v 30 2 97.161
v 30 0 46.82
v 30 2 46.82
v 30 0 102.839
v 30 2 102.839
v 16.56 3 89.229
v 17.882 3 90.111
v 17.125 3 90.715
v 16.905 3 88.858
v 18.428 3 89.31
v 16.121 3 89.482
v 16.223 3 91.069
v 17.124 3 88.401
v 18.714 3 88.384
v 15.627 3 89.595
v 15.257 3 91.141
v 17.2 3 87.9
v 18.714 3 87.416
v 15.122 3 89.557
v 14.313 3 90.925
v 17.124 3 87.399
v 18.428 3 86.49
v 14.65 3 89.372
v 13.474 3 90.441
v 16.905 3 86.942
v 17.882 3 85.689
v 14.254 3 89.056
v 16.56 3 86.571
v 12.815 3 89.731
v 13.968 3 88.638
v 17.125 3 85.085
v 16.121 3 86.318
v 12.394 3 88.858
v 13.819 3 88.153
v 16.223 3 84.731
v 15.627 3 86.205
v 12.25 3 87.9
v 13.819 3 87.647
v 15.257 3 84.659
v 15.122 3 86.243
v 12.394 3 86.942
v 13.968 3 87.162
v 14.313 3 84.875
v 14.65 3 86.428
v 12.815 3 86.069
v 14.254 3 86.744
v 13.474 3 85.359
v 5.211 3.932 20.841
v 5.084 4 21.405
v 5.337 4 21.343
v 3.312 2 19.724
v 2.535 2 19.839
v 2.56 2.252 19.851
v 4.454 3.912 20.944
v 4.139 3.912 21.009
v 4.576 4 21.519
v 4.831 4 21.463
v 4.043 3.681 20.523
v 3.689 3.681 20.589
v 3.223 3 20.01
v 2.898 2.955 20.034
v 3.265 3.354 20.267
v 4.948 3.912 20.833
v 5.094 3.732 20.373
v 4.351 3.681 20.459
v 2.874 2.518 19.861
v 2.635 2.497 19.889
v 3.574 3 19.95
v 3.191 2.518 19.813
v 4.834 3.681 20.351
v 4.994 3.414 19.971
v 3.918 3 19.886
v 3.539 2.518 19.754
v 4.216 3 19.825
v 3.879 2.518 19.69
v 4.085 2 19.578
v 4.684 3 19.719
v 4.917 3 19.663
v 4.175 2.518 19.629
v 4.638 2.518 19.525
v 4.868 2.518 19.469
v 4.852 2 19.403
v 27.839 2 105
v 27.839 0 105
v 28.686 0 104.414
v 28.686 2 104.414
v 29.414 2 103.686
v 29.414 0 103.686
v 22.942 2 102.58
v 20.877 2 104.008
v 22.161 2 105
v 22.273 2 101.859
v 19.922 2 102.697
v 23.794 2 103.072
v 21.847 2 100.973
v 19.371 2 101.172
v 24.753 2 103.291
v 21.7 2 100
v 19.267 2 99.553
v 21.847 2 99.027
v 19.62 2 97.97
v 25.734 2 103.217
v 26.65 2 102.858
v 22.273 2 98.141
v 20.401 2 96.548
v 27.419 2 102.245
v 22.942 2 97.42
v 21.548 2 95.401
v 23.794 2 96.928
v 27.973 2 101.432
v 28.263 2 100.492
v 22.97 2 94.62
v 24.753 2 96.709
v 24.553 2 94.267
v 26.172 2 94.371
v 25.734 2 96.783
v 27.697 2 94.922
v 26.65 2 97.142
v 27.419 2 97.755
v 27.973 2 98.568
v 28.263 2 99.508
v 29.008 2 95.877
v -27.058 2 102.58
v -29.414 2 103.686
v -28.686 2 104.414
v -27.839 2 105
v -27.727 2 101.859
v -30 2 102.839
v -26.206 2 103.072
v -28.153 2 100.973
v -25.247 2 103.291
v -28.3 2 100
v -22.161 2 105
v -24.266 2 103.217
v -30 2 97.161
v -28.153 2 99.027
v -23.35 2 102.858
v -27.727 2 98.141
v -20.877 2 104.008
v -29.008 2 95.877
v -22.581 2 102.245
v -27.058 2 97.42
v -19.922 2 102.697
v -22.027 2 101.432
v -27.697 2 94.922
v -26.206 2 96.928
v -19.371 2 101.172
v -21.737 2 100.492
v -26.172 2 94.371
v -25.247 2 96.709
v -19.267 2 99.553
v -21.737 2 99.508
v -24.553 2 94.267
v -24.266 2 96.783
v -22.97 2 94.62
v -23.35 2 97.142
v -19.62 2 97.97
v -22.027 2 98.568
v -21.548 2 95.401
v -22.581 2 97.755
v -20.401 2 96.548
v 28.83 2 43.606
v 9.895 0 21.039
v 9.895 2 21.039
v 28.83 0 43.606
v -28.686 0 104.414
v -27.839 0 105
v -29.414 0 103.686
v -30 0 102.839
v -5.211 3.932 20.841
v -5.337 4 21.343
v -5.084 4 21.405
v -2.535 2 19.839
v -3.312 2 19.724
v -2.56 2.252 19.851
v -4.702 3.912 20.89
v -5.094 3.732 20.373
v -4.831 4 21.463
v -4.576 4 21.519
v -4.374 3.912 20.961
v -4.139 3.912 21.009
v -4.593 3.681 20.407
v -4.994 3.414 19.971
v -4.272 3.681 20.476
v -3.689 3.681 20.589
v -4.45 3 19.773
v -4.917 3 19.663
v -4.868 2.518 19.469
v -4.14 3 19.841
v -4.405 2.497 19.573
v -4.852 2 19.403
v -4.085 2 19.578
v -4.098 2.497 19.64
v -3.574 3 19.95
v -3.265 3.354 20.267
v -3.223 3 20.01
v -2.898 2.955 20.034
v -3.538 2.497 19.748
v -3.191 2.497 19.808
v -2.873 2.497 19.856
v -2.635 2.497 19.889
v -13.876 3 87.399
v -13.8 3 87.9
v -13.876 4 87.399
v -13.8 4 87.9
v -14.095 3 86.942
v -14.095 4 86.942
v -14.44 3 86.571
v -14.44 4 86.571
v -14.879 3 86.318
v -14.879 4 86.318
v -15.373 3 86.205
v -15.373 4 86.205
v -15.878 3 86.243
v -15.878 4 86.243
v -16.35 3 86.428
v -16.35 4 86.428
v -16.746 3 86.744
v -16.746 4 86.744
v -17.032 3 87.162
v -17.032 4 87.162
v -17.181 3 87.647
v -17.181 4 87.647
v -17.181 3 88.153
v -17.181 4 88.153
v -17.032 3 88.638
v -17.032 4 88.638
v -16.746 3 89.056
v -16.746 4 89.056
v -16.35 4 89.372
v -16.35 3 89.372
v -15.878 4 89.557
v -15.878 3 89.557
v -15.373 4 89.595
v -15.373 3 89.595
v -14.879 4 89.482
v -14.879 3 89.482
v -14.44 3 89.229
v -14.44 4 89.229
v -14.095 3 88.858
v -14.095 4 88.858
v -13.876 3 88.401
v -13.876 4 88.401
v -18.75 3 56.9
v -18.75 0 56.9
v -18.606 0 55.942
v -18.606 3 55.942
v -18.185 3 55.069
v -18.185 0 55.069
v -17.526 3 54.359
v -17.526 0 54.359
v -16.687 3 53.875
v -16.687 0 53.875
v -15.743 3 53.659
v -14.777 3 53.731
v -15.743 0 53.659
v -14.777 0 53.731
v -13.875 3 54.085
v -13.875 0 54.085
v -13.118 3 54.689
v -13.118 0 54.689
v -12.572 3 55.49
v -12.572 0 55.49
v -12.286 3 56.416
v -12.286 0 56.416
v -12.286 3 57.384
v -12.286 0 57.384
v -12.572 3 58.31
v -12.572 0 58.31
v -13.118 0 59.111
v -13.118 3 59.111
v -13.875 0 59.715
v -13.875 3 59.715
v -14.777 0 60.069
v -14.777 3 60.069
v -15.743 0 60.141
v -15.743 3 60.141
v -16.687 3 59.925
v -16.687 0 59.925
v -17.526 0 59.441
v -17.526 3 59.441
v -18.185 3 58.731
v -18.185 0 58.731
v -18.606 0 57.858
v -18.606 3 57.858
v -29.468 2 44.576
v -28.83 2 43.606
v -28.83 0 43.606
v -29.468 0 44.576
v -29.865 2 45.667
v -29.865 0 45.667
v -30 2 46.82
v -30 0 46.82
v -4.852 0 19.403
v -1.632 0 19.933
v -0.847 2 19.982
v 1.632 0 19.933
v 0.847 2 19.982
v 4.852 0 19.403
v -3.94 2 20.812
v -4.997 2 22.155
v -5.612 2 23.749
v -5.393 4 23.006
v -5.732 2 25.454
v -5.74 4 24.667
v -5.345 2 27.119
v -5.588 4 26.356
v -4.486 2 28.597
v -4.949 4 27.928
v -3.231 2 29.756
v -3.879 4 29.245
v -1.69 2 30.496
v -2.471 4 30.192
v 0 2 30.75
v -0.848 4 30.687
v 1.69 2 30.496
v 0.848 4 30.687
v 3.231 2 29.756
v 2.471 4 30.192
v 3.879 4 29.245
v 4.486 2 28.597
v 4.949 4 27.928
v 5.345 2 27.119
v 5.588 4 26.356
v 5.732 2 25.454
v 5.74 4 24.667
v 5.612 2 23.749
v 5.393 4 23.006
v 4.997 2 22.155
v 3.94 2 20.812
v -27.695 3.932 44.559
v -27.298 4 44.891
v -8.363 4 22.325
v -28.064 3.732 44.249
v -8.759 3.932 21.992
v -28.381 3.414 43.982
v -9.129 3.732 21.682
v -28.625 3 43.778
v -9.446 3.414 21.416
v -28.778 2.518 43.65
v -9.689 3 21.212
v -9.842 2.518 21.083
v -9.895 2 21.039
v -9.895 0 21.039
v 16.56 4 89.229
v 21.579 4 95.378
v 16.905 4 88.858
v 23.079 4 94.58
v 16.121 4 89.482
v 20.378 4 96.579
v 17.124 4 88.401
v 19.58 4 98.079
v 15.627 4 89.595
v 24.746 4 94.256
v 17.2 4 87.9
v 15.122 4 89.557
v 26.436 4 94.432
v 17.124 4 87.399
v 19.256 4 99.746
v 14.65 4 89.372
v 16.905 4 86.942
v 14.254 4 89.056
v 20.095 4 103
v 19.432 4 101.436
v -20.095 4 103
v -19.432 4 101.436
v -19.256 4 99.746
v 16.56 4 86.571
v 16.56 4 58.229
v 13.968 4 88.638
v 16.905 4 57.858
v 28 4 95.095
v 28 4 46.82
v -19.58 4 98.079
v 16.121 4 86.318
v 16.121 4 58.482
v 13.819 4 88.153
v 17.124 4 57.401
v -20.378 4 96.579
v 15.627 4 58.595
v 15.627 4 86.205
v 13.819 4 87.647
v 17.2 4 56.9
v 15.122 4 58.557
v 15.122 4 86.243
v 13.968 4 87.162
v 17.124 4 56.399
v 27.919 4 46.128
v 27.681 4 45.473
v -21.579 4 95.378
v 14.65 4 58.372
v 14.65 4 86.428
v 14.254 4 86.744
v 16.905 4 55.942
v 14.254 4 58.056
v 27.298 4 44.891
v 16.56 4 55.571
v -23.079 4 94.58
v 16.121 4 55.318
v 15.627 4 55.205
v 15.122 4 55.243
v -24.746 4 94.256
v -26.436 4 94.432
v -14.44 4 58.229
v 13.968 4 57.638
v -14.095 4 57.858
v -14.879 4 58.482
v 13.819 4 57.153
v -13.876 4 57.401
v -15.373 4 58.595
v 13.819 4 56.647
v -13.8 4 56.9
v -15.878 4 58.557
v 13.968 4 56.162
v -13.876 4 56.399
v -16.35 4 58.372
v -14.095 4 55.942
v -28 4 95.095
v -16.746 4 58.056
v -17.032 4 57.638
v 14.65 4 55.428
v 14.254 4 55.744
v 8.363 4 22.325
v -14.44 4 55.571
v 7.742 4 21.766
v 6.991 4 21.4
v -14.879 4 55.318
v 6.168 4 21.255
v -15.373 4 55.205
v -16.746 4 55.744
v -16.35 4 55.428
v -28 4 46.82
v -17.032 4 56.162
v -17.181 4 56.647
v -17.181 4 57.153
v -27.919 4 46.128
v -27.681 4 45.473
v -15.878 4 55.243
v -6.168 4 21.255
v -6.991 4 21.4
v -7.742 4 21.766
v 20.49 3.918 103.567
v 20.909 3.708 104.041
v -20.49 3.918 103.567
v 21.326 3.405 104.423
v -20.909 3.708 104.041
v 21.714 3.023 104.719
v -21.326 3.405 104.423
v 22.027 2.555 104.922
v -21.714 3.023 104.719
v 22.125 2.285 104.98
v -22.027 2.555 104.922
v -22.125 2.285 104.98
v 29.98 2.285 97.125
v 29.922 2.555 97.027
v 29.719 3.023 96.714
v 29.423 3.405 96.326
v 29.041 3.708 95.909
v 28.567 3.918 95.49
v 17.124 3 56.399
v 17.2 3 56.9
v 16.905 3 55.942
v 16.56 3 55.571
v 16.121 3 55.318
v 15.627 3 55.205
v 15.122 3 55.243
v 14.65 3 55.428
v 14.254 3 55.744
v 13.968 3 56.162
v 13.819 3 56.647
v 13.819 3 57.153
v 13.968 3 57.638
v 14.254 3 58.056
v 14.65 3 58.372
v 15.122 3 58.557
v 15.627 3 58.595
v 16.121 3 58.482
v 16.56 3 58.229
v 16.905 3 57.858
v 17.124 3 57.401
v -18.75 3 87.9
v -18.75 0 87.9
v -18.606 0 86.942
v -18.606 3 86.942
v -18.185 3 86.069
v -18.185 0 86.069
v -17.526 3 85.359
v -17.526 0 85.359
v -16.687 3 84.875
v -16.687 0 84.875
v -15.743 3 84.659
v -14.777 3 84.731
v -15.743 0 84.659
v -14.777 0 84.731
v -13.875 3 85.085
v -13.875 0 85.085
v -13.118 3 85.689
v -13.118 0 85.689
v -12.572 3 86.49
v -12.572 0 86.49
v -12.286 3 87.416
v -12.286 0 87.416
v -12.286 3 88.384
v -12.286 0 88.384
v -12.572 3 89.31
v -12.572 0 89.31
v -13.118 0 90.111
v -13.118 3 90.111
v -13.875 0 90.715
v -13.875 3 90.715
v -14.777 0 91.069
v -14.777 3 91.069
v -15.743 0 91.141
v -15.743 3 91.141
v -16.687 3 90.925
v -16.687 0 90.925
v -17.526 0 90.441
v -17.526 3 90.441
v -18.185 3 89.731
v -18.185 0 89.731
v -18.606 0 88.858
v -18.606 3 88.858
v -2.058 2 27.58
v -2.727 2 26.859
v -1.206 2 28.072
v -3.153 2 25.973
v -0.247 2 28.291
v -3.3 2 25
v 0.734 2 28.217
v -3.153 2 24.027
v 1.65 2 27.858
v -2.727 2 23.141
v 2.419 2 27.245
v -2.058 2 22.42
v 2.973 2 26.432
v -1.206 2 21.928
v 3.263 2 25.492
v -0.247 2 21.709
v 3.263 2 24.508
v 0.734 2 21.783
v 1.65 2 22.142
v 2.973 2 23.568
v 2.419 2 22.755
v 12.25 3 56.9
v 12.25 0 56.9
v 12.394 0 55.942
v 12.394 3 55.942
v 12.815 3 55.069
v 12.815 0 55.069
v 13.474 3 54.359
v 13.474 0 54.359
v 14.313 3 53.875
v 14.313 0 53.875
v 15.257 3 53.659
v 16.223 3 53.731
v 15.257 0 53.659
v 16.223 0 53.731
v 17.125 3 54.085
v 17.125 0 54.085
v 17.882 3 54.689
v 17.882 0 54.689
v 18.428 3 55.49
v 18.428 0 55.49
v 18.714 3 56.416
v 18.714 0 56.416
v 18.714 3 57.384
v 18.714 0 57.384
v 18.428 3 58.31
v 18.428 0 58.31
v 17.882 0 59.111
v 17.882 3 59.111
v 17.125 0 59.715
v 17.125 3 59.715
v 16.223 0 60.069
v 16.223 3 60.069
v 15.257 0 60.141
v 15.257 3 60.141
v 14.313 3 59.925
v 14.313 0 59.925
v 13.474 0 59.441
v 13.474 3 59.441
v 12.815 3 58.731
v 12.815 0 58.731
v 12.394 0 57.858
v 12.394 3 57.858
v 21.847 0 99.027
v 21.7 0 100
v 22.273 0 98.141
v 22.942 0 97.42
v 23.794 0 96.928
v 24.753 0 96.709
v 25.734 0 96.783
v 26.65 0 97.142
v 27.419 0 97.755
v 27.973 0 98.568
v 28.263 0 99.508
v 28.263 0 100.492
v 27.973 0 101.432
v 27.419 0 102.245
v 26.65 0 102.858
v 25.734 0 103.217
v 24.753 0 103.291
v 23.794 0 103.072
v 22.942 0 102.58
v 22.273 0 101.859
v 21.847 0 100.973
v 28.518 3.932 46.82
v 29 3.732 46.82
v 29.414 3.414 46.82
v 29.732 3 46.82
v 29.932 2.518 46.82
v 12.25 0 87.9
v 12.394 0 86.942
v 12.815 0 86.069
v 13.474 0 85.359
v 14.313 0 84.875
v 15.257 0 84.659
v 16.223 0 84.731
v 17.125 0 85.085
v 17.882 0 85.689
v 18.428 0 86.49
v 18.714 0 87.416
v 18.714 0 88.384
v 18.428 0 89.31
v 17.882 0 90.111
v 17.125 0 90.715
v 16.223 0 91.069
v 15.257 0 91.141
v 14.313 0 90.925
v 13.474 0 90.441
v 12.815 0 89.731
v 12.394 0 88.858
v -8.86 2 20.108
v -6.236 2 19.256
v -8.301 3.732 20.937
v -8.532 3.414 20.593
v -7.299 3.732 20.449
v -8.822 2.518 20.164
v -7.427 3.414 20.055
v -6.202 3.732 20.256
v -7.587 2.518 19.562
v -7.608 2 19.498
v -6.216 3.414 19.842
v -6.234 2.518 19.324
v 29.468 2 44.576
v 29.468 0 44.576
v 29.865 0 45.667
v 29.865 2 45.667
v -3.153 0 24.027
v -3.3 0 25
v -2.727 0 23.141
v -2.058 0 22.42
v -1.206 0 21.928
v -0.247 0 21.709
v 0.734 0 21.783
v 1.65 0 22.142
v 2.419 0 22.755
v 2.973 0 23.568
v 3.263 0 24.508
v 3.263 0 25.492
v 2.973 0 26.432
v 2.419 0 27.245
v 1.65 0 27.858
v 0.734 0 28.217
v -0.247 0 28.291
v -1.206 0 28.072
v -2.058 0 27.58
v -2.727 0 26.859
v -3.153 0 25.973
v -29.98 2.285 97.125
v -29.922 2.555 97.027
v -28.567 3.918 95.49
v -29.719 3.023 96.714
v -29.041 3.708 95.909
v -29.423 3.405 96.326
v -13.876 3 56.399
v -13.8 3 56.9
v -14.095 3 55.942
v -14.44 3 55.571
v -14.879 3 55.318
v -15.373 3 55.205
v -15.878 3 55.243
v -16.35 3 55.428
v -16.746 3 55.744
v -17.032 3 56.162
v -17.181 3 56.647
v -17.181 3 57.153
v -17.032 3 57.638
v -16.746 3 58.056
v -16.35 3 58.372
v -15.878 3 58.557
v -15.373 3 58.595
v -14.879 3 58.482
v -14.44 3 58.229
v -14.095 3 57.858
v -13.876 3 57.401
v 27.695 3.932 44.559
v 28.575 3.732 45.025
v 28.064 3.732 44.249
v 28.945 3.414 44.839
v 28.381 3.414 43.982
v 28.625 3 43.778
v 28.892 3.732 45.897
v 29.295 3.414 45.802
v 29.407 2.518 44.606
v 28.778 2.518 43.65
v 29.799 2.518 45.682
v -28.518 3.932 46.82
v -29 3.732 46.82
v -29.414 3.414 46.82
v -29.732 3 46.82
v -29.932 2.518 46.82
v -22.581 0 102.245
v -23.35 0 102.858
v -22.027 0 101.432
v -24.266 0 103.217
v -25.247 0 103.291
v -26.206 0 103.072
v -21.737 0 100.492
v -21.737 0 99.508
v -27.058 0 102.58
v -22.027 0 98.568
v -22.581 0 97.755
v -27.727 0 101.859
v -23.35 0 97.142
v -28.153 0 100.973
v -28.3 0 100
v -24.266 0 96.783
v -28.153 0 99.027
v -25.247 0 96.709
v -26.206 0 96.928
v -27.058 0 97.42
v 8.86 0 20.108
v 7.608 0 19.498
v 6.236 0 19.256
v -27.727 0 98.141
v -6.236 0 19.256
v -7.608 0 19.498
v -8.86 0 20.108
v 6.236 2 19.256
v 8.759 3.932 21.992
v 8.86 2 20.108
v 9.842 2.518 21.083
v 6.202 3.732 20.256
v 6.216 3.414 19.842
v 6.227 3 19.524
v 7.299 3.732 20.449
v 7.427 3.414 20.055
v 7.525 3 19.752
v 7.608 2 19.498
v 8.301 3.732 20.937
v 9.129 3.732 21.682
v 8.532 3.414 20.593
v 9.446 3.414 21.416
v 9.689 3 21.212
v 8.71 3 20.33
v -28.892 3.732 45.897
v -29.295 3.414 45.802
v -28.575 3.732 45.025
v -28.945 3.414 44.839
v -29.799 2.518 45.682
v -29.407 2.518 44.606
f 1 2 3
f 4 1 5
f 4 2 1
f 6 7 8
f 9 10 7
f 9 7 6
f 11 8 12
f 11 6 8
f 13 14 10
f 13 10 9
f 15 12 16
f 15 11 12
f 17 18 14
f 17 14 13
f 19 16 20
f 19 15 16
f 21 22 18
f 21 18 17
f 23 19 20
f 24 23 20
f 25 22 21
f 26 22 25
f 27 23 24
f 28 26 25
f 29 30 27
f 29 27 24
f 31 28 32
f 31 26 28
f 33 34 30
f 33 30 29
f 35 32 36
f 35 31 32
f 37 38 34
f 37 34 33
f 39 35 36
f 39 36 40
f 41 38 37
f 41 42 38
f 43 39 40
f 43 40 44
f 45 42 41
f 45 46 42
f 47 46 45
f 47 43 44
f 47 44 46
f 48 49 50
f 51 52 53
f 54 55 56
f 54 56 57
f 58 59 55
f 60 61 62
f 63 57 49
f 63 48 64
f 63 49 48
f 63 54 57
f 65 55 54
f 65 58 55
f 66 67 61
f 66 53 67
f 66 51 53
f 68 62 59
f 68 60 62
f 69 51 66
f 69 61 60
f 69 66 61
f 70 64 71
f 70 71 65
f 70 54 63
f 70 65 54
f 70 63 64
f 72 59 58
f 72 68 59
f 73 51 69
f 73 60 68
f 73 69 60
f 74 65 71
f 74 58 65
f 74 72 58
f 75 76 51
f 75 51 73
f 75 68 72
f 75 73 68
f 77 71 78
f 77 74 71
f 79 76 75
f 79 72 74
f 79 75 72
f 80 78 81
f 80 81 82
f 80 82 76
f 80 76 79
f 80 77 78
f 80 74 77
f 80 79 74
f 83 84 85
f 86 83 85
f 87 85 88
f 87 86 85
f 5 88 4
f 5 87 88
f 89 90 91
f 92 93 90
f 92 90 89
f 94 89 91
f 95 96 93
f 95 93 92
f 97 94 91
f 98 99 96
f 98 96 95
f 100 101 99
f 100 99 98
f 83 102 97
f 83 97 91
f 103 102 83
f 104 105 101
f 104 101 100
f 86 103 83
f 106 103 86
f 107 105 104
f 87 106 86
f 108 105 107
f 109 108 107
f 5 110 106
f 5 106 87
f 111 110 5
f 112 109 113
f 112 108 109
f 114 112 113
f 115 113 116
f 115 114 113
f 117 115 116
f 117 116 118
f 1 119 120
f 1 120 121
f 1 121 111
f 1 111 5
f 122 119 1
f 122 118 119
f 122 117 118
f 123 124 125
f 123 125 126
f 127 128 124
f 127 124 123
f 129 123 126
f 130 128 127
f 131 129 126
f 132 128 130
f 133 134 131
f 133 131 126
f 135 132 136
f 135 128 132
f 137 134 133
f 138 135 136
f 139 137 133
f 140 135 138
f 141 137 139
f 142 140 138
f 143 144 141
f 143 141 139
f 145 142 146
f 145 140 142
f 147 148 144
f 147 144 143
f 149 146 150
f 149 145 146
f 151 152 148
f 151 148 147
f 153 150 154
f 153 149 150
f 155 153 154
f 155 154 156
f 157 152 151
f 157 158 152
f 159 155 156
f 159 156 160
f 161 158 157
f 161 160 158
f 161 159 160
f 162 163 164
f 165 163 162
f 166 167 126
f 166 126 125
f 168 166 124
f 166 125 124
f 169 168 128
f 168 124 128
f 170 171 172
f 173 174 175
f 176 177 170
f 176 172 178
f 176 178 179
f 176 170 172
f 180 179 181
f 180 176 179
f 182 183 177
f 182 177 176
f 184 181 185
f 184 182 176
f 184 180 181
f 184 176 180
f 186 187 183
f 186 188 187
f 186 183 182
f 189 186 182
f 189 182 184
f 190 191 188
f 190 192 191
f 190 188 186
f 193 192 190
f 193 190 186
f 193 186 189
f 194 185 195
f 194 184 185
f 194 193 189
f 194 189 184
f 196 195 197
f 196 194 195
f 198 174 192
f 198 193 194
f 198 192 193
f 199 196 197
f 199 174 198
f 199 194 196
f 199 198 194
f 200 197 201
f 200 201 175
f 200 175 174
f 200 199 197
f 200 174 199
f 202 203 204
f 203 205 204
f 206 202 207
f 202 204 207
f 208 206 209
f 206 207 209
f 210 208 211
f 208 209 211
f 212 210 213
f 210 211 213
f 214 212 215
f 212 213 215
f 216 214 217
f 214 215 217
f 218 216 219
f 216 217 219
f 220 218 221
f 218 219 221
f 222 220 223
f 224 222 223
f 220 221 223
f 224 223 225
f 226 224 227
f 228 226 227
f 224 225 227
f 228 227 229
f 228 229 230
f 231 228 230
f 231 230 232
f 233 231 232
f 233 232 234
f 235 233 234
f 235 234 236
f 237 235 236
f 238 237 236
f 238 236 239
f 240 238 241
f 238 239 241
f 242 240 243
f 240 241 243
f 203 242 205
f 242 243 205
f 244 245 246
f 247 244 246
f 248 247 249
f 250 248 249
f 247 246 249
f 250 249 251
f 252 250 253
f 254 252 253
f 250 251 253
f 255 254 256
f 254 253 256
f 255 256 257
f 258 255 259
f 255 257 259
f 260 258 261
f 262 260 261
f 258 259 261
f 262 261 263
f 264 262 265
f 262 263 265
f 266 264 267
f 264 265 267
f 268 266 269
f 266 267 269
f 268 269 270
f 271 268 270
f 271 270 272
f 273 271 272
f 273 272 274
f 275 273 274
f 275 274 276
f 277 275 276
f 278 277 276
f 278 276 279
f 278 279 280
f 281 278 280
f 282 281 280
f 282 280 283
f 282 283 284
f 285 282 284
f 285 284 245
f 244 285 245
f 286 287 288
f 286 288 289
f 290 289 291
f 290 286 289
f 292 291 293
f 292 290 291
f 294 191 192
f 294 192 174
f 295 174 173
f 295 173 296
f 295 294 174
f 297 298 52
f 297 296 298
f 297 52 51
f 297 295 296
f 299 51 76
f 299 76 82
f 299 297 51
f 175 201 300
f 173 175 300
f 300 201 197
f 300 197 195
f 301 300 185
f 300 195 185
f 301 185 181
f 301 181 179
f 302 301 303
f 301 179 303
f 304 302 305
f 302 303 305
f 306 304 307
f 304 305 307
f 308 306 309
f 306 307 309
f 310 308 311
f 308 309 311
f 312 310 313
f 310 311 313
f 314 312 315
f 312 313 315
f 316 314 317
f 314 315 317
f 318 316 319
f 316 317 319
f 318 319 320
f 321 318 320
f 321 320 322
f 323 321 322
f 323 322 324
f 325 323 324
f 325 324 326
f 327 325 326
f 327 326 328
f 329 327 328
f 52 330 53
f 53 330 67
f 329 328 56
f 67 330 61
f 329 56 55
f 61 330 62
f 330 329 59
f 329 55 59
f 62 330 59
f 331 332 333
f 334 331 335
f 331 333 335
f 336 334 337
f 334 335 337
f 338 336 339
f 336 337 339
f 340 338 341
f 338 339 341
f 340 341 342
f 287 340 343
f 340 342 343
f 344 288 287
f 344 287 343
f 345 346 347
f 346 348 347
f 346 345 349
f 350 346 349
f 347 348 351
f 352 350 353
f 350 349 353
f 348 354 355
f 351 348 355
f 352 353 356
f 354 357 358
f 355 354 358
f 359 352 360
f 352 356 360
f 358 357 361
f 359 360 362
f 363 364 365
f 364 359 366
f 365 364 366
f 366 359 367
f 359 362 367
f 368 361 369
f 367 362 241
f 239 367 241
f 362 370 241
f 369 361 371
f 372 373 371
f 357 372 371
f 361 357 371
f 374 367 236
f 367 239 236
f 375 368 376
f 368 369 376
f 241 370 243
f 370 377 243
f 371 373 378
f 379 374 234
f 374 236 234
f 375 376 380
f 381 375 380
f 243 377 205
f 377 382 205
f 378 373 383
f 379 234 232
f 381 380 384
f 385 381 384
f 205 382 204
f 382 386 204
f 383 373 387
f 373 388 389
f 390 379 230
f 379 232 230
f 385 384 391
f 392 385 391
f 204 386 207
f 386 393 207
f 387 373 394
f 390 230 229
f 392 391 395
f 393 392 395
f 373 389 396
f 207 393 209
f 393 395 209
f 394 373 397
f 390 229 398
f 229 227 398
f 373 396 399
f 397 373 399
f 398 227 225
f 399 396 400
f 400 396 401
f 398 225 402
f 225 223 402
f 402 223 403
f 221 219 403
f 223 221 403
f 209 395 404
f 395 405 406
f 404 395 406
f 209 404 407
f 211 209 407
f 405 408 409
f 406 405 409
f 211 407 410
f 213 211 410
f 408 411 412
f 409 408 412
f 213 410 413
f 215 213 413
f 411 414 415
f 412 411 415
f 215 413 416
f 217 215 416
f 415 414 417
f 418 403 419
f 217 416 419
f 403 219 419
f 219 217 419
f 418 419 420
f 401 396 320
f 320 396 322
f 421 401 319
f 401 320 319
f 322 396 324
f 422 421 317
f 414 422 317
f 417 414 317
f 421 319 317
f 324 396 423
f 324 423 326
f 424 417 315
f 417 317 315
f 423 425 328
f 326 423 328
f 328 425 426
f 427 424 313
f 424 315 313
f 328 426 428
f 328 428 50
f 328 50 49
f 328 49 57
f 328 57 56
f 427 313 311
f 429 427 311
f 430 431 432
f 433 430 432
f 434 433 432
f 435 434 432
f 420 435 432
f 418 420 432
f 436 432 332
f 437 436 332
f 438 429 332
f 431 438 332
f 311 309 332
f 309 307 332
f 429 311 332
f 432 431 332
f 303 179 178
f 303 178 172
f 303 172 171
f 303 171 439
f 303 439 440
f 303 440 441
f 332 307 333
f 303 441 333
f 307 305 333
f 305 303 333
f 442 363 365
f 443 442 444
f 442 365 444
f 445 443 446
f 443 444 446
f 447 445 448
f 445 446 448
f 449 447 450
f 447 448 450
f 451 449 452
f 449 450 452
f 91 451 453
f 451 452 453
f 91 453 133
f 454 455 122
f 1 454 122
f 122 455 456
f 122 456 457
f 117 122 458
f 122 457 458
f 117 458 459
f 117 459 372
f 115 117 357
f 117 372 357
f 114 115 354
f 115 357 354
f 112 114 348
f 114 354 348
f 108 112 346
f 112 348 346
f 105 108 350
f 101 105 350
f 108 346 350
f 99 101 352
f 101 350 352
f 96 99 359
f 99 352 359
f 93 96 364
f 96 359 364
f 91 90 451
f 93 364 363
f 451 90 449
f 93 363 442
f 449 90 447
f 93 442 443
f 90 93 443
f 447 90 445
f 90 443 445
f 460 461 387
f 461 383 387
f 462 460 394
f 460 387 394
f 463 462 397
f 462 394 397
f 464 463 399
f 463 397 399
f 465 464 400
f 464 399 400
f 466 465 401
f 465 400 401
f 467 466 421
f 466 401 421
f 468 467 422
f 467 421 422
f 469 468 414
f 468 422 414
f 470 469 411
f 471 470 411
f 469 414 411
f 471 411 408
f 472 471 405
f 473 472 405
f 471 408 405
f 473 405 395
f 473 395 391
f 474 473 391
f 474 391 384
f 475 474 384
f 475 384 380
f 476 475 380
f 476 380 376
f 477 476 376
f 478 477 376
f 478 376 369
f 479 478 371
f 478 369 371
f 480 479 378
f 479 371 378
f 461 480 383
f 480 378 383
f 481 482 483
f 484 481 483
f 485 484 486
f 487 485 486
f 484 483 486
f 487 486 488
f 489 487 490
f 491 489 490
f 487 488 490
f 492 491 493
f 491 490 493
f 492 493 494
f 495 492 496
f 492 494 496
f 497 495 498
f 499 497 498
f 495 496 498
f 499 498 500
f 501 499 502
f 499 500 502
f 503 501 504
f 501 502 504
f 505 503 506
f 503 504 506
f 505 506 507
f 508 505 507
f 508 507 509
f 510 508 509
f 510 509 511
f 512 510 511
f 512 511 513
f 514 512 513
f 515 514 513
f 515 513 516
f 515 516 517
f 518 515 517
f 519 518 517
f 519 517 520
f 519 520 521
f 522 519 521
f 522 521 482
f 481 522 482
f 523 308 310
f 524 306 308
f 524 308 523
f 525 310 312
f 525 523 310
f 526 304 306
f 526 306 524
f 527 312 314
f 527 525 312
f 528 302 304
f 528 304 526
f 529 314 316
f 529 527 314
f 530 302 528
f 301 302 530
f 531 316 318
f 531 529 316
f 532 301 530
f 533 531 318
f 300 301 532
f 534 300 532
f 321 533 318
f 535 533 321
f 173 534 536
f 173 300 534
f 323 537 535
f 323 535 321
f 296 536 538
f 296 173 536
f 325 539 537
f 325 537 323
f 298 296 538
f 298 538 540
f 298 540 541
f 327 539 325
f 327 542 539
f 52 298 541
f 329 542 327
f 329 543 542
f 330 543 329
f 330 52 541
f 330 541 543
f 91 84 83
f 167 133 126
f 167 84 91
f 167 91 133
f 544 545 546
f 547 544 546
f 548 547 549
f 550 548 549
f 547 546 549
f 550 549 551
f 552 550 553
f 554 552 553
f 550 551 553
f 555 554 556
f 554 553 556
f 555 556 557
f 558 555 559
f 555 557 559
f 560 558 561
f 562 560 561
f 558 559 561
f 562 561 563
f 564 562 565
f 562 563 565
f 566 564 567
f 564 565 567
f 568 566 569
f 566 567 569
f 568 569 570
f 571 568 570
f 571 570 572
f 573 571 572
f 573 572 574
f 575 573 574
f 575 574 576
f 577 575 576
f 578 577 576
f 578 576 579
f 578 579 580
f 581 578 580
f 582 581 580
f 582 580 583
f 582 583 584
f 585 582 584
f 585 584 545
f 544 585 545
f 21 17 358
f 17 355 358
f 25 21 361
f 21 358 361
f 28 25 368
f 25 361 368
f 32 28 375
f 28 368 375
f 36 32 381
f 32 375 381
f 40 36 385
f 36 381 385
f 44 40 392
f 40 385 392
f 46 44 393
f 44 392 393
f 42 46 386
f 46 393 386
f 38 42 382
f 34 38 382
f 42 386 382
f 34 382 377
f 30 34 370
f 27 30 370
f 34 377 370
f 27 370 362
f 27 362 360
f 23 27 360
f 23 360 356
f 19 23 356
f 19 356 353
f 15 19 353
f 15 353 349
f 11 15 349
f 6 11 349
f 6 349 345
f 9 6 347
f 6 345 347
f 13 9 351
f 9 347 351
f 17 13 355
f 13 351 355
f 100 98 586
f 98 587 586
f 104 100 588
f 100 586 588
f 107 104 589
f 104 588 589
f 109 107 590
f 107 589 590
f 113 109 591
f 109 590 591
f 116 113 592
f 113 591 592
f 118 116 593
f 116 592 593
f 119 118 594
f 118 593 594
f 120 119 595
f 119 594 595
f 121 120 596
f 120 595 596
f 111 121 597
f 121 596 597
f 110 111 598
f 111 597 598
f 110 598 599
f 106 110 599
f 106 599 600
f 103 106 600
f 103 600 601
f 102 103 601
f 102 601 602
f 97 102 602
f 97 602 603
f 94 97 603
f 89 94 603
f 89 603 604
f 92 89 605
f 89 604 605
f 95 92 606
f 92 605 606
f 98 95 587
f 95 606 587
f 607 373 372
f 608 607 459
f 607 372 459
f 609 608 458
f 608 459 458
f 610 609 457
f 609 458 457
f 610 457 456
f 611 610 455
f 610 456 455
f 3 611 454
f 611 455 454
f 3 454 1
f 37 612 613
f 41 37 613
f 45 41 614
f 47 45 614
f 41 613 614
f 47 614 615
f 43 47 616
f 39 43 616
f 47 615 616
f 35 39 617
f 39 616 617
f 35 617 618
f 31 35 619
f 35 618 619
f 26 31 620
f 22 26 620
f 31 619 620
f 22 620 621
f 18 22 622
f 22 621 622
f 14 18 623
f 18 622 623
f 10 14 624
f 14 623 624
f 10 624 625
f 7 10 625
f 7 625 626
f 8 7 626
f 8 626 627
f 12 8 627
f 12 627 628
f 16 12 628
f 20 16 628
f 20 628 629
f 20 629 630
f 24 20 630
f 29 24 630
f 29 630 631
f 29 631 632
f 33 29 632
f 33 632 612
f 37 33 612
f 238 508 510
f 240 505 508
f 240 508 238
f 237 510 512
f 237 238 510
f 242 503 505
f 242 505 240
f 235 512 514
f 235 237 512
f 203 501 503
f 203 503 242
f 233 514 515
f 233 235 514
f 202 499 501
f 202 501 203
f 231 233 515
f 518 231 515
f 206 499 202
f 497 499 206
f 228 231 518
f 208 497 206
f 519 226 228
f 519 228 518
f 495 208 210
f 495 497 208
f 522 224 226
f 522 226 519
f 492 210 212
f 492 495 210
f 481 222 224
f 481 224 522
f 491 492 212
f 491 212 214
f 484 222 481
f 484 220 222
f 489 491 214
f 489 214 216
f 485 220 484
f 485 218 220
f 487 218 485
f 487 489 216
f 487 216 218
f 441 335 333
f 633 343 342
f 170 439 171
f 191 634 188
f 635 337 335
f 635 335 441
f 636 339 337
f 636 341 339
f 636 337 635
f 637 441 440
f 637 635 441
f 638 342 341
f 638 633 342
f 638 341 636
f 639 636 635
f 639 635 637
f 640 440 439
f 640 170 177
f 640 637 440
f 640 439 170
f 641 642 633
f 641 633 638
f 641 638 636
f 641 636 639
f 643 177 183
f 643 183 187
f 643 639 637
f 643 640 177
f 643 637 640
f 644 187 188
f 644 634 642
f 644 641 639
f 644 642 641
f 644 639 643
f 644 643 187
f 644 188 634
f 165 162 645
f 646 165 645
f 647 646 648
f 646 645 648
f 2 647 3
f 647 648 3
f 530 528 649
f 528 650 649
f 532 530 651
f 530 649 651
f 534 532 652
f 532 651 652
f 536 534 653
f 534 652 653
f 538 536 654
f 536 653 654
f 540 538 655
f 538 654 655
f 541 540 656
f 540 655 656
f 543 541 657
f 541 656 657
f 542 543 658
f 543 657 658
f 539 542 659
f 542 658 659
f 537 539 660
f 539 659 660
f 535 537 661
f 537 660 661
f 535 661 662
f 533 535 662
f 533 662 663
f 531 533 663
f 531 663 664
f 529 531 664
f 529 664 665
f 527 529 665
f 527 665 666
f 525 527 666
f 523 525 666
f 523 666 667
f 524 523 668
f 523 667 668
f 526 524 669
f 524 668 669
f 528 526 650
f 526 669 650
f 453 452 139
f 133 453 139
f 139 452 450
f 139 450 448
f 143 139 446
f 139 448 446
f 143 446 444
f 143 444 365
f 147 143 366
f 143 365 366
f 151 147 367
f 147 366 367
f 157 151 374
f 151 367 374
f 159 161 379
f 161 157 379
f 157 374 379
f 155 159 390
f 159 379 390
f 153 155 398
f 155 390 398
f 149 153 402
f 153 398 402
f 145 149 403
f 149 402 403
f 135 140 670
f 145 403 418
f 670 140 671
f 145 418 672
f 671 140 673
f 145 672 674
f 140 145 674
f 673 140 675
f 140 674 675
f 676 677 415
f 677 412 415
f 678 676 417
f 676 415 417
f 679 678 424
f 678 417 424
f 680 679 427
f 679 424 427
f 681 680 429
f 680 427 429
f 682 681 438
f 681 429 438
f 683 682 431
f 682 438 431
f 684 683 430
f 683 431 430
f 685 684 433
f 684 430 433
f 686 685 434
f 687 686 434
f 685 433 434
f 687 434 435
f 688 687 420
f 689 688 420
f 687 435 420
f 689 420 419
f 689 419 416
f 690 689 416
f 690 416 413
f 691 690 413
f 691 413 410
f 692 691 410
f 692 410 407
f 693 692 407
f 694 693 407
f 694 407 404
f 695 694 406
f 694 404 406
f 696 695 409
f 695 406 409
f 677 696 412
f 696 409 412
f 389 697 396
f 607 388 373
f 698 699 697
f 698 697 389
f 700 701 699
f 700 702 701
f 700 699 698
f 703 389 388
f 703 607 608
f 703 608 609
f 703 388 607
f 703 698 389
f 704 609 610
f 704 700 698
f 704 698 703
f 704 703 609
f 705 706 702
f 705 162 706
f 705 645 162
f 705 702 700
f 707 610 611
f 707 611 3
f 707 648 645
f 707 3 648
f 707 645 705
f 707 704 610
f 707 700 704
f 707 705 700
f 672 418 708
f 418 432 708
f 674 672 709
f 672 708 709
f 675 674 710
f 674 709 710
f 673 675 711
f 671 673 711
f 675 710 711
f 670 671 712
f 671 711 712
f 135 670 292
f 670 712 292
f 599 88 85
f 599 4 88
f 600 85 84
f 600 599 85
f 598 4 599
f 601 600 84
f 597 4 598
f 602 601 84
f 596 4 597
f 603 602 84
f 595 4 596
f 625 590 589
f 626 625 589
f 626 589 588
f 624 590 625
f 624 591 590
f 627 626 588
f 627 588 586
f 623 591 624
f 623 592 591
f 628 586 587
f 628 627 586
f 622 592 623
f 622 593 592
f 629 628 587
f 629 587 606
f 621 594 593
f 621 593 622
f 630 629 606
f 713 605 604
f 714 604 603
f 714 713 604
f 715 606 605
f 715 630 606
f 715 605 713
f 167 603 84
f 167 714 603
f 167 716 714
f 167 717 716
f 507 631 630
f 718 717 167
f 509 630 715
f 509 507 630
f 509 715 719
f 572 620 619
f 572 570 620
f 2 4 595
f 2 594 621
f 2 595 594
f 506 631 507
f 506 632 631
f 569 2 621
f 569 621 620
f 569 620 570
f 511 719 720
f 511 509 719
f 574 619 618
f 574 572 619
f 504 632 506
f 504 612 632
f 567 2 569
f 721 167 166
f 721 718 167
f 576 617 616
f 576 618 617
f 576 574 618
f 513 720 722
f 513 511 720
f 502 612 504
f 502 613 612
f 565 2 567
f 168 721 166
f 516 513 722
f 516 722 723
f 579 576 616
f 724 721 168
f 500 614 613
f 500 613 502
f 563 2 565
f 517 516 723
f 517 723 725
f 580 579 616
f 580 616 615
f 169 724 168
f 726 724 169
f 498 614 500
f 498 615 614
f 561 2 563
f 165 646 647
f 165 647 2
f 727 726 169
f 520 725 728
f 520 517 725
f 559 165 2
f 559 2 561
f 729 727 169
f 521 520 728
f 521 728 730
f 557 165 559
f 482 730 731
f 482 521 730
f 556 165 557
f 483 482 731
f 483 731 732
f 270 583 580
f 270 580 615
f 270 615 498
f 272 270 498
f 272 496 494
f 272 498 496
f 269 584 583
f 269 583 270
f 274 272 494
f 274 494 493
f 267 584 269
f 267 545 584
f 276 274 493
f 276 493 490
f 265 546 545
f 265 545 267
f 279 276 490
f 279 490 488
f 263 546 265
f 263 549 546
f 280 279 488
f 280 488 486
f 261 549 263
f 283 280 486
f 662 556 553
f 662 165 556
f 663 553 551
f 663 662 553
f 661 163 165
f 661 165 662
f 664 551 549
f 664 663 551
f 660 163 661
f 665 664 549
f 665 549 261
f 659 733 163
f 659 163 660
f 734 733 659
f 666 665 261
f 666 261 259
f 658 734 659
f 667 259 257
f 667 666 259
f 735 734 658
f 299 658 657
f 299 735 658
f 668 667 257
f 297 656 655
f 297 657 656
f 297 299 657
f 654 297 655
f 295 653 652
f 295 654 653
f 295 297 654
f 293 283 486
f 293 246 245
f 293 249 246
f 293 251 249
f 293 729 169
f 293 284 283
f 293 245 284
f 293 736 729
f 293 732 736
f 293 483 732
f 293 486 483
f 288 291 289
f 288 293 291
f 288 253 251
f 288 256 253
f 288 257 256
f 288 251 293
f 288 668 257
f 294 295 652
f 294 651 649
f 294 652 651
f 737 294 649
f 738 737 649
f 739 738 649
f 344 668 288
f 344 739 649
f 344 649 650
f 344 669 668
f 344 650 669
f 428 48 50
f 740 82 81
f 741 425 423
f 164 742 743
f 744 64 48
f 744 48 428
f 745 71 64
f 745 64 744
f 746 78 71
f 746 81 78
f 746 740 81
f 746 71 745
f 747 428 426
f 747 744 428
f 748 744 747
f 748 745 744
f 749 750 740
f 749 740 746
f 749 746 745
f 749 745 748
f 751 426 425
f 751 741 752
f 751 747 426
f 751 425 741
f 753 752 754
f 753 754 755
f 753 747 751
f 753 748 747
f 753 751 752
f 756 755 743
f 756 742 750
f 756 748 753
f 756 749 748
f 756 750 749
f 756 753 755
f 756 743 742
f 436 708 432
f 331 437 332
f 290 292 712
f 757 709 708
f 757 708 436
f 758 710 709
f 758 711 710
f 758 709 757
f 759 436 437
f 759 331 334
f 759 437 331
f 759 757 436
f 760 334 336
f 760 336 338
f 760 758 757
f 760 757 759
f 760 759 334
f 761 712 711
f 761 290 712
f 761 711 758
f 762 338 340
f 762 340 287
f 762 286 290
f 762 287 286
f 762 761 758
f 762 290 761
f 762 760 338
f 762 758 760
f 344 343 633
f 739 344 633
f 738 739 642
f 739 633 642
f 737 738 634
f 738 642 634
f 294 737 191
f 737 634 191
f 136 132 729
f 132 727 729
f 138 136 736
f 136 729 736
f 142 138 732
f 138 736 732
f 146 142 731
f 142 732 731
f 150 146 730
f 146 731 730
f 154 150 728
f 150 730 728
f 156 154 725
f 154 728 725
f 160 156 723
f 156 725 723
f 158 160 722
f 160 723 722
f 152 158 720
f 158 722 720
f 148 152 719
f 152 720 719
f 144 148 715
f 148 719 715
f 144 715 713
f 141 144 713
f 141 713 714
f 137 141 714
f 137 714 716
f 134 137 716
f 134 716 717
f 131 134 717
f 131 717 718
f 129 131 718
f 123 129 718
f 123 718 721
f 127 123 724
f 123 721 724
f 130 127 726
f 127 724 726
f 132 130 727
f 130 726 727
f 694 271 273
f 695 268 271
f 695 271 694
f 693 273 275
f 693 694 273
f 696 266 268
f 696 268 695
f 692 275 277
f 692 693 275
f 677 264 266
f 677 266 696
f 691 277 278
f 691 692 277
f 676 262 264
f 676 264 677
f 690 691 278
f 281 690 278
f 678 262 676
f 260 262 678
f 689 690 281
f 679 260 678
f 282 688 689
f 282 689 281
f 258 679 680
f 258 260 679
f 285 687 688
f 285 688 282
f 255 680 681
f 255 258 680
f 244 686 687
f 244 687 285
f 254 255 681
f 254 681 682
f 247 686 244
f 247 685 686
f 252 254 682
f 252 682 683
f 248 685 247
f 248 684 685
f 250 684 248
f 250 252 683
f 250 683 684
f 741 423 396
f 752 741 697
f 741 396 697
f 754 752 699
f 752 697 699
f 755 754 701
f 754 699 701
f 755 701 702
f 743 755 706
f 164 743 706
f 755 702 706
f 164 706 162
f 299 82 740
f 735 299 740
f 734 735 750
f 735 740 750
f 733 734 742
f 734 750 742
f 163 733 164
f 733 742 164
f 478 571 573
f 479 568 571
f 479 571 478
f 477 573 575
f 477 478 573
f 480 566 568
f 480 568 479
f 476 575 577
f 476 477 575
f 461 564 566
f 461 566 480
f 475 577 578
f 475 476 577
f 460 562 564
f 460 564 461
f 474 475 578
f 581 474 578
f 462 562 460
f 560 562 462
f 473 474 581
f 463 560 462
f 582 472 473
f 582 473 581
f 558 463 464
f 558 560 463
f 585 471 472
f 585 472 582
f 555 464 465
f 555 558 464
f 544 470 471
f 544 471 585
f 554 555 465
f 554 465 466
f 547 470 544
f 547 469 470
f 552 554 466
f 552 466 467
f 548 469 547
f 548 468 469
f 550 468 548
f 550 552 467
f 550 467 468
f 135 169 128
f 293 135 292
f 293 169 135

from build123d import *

# Parameters (mm, degrees)
BOSS_EXTRUDE1_DEPTH            = 4
HOLE1_D                        = 6.6
HOLE1_CBORE_D                  = 11.5
HOLE1_CBORE_DEPTH              = 2
CUT_EXTRUDE3_DEPTH             = 110.27488275
CBORE_FOR_M3_SHCS1_D           = 3.4
CBORE_FOR_M3_SHCS1_CBORE_D     = 6.5
CBORE_FOR_M3_SHCS1_CBORE_DEPTH = 3
FILLET4_R                      = 5
FILLET3_R                      = 2


with BuildPart() as part:
    # Sketch2 → Boss-Extrude1 (new body)
    with BuildSketch(Plane(origin=(0, 0, 0), x_dir=(1, 0, 0), z_dir=(0, 1, 0))):
        with BuildLine():
            Line((-30, -45), (-7.721394619, -18.449391999))
            ThreePointArc((-7.721394619, -18.449391999), (0, -20), (7.721394619, -18.449391999))
            Line((7.721394619, -18.449391999), (30, -45))
            Line((30, -45), (30, -105))
            Line((30, -105), (-30, -105))
            Line((-30, -105), (-30, -45))
        make_face()
    extrude(amount=BOSS_EXTRUDE1_DEPTH)

    # Hole1 (through all)
    with Locations(Plane(origin=(0, 4, 0), x_dir=(1, 0, 0), z_dir=(0, 1, 0))):
        with Locations((-25, -100), (25, -100), (0, -25)):
            CounterBoreHole(HOLE1_D / 2, HOLE1_CBORE_D / 2, HOLE1_CBORE_DEPTH)

    # Sketch5 → Cut-Extrude3 (cut, through all)
    with BuildSketch(Plane(origin=(0, 4, 0), x_dir=(1, 0, 0), z_dir=(0, 1, 0))):
        with BuildLine():
            Line((-30, -102.839454173), (-30, -105))
            Line((-30, -105), (-27.839454173, -105))
            ThreePointArc((-27.839454173, -105), (-29.065863992, -104.065863992), (-30, -102.839454173))
        make_face()
        with BuildLine():
            Line((30, -105), (27.839454173, -105))
            ThreePointArc((27.839454173, -105), (29.065863992, -104.065863992), (30, -102.839454173))
            Line((30, -102.839454173), (30, -105))
        make_face()
    extrude(amount=-CUT_EXTRUDE3_DEPTH, mode=Mode.SUBTRACT)

    # CBORE for M3 SHCS1 (through all)
    with Locations(Plane(origin=(0, 0, 0), x_dir=(-1, 0, 0), z_dir=(0, -1, 0))):
        with Locations((-15.5, -56.9), (15.5, -56.9), (15.5, -87.9), (-15.5, -87.9)):
            CounterBoreHole(CBORE_FOR_M3_SHCS1_D / 2, CBORE_FOR_M3_SHCS1_CBORE_D / 2, CBORE_FOR_M3_SHCS1_CBORE_DEPTH)

    # Fillet4
    fillet4_edges = [part.edges().sort_by_distance(p)[0] for p in [
        (-30, 2, 45),
        (-7.721394619, 2, 18.449391999),
        (7.721394619, 2, 18.449391999),
        (30, 2, 45),
    ]]
    fillet(fillet4_edges, radius=FILLET4_R)

    # Fillet3
    fillet3_edges = [part.edges().sort_by_distance(p)[0] for p in [
        (30, 4, 71.990198499),
        (0, 4, 105),
        (-30, 4, 71.990198499),
        (-19.362432028, 4, 32.322640153),
        (-29.698463104, 4, 45.109750455),
        (-3.699480023, 4, 19.654868292),
        (-7.607899613, 4, 19.497501458),
        (29.698463104, 4, 45.109750455),
        (19.362432028, 4, 32.322640153),
        (7.607899613, 4, 19.497501458),
        (3.699480023, 4, 19.654868292),
    ]]
    fillet(fillet3_edges, radius=FILLET3_R)


solid = part.part
